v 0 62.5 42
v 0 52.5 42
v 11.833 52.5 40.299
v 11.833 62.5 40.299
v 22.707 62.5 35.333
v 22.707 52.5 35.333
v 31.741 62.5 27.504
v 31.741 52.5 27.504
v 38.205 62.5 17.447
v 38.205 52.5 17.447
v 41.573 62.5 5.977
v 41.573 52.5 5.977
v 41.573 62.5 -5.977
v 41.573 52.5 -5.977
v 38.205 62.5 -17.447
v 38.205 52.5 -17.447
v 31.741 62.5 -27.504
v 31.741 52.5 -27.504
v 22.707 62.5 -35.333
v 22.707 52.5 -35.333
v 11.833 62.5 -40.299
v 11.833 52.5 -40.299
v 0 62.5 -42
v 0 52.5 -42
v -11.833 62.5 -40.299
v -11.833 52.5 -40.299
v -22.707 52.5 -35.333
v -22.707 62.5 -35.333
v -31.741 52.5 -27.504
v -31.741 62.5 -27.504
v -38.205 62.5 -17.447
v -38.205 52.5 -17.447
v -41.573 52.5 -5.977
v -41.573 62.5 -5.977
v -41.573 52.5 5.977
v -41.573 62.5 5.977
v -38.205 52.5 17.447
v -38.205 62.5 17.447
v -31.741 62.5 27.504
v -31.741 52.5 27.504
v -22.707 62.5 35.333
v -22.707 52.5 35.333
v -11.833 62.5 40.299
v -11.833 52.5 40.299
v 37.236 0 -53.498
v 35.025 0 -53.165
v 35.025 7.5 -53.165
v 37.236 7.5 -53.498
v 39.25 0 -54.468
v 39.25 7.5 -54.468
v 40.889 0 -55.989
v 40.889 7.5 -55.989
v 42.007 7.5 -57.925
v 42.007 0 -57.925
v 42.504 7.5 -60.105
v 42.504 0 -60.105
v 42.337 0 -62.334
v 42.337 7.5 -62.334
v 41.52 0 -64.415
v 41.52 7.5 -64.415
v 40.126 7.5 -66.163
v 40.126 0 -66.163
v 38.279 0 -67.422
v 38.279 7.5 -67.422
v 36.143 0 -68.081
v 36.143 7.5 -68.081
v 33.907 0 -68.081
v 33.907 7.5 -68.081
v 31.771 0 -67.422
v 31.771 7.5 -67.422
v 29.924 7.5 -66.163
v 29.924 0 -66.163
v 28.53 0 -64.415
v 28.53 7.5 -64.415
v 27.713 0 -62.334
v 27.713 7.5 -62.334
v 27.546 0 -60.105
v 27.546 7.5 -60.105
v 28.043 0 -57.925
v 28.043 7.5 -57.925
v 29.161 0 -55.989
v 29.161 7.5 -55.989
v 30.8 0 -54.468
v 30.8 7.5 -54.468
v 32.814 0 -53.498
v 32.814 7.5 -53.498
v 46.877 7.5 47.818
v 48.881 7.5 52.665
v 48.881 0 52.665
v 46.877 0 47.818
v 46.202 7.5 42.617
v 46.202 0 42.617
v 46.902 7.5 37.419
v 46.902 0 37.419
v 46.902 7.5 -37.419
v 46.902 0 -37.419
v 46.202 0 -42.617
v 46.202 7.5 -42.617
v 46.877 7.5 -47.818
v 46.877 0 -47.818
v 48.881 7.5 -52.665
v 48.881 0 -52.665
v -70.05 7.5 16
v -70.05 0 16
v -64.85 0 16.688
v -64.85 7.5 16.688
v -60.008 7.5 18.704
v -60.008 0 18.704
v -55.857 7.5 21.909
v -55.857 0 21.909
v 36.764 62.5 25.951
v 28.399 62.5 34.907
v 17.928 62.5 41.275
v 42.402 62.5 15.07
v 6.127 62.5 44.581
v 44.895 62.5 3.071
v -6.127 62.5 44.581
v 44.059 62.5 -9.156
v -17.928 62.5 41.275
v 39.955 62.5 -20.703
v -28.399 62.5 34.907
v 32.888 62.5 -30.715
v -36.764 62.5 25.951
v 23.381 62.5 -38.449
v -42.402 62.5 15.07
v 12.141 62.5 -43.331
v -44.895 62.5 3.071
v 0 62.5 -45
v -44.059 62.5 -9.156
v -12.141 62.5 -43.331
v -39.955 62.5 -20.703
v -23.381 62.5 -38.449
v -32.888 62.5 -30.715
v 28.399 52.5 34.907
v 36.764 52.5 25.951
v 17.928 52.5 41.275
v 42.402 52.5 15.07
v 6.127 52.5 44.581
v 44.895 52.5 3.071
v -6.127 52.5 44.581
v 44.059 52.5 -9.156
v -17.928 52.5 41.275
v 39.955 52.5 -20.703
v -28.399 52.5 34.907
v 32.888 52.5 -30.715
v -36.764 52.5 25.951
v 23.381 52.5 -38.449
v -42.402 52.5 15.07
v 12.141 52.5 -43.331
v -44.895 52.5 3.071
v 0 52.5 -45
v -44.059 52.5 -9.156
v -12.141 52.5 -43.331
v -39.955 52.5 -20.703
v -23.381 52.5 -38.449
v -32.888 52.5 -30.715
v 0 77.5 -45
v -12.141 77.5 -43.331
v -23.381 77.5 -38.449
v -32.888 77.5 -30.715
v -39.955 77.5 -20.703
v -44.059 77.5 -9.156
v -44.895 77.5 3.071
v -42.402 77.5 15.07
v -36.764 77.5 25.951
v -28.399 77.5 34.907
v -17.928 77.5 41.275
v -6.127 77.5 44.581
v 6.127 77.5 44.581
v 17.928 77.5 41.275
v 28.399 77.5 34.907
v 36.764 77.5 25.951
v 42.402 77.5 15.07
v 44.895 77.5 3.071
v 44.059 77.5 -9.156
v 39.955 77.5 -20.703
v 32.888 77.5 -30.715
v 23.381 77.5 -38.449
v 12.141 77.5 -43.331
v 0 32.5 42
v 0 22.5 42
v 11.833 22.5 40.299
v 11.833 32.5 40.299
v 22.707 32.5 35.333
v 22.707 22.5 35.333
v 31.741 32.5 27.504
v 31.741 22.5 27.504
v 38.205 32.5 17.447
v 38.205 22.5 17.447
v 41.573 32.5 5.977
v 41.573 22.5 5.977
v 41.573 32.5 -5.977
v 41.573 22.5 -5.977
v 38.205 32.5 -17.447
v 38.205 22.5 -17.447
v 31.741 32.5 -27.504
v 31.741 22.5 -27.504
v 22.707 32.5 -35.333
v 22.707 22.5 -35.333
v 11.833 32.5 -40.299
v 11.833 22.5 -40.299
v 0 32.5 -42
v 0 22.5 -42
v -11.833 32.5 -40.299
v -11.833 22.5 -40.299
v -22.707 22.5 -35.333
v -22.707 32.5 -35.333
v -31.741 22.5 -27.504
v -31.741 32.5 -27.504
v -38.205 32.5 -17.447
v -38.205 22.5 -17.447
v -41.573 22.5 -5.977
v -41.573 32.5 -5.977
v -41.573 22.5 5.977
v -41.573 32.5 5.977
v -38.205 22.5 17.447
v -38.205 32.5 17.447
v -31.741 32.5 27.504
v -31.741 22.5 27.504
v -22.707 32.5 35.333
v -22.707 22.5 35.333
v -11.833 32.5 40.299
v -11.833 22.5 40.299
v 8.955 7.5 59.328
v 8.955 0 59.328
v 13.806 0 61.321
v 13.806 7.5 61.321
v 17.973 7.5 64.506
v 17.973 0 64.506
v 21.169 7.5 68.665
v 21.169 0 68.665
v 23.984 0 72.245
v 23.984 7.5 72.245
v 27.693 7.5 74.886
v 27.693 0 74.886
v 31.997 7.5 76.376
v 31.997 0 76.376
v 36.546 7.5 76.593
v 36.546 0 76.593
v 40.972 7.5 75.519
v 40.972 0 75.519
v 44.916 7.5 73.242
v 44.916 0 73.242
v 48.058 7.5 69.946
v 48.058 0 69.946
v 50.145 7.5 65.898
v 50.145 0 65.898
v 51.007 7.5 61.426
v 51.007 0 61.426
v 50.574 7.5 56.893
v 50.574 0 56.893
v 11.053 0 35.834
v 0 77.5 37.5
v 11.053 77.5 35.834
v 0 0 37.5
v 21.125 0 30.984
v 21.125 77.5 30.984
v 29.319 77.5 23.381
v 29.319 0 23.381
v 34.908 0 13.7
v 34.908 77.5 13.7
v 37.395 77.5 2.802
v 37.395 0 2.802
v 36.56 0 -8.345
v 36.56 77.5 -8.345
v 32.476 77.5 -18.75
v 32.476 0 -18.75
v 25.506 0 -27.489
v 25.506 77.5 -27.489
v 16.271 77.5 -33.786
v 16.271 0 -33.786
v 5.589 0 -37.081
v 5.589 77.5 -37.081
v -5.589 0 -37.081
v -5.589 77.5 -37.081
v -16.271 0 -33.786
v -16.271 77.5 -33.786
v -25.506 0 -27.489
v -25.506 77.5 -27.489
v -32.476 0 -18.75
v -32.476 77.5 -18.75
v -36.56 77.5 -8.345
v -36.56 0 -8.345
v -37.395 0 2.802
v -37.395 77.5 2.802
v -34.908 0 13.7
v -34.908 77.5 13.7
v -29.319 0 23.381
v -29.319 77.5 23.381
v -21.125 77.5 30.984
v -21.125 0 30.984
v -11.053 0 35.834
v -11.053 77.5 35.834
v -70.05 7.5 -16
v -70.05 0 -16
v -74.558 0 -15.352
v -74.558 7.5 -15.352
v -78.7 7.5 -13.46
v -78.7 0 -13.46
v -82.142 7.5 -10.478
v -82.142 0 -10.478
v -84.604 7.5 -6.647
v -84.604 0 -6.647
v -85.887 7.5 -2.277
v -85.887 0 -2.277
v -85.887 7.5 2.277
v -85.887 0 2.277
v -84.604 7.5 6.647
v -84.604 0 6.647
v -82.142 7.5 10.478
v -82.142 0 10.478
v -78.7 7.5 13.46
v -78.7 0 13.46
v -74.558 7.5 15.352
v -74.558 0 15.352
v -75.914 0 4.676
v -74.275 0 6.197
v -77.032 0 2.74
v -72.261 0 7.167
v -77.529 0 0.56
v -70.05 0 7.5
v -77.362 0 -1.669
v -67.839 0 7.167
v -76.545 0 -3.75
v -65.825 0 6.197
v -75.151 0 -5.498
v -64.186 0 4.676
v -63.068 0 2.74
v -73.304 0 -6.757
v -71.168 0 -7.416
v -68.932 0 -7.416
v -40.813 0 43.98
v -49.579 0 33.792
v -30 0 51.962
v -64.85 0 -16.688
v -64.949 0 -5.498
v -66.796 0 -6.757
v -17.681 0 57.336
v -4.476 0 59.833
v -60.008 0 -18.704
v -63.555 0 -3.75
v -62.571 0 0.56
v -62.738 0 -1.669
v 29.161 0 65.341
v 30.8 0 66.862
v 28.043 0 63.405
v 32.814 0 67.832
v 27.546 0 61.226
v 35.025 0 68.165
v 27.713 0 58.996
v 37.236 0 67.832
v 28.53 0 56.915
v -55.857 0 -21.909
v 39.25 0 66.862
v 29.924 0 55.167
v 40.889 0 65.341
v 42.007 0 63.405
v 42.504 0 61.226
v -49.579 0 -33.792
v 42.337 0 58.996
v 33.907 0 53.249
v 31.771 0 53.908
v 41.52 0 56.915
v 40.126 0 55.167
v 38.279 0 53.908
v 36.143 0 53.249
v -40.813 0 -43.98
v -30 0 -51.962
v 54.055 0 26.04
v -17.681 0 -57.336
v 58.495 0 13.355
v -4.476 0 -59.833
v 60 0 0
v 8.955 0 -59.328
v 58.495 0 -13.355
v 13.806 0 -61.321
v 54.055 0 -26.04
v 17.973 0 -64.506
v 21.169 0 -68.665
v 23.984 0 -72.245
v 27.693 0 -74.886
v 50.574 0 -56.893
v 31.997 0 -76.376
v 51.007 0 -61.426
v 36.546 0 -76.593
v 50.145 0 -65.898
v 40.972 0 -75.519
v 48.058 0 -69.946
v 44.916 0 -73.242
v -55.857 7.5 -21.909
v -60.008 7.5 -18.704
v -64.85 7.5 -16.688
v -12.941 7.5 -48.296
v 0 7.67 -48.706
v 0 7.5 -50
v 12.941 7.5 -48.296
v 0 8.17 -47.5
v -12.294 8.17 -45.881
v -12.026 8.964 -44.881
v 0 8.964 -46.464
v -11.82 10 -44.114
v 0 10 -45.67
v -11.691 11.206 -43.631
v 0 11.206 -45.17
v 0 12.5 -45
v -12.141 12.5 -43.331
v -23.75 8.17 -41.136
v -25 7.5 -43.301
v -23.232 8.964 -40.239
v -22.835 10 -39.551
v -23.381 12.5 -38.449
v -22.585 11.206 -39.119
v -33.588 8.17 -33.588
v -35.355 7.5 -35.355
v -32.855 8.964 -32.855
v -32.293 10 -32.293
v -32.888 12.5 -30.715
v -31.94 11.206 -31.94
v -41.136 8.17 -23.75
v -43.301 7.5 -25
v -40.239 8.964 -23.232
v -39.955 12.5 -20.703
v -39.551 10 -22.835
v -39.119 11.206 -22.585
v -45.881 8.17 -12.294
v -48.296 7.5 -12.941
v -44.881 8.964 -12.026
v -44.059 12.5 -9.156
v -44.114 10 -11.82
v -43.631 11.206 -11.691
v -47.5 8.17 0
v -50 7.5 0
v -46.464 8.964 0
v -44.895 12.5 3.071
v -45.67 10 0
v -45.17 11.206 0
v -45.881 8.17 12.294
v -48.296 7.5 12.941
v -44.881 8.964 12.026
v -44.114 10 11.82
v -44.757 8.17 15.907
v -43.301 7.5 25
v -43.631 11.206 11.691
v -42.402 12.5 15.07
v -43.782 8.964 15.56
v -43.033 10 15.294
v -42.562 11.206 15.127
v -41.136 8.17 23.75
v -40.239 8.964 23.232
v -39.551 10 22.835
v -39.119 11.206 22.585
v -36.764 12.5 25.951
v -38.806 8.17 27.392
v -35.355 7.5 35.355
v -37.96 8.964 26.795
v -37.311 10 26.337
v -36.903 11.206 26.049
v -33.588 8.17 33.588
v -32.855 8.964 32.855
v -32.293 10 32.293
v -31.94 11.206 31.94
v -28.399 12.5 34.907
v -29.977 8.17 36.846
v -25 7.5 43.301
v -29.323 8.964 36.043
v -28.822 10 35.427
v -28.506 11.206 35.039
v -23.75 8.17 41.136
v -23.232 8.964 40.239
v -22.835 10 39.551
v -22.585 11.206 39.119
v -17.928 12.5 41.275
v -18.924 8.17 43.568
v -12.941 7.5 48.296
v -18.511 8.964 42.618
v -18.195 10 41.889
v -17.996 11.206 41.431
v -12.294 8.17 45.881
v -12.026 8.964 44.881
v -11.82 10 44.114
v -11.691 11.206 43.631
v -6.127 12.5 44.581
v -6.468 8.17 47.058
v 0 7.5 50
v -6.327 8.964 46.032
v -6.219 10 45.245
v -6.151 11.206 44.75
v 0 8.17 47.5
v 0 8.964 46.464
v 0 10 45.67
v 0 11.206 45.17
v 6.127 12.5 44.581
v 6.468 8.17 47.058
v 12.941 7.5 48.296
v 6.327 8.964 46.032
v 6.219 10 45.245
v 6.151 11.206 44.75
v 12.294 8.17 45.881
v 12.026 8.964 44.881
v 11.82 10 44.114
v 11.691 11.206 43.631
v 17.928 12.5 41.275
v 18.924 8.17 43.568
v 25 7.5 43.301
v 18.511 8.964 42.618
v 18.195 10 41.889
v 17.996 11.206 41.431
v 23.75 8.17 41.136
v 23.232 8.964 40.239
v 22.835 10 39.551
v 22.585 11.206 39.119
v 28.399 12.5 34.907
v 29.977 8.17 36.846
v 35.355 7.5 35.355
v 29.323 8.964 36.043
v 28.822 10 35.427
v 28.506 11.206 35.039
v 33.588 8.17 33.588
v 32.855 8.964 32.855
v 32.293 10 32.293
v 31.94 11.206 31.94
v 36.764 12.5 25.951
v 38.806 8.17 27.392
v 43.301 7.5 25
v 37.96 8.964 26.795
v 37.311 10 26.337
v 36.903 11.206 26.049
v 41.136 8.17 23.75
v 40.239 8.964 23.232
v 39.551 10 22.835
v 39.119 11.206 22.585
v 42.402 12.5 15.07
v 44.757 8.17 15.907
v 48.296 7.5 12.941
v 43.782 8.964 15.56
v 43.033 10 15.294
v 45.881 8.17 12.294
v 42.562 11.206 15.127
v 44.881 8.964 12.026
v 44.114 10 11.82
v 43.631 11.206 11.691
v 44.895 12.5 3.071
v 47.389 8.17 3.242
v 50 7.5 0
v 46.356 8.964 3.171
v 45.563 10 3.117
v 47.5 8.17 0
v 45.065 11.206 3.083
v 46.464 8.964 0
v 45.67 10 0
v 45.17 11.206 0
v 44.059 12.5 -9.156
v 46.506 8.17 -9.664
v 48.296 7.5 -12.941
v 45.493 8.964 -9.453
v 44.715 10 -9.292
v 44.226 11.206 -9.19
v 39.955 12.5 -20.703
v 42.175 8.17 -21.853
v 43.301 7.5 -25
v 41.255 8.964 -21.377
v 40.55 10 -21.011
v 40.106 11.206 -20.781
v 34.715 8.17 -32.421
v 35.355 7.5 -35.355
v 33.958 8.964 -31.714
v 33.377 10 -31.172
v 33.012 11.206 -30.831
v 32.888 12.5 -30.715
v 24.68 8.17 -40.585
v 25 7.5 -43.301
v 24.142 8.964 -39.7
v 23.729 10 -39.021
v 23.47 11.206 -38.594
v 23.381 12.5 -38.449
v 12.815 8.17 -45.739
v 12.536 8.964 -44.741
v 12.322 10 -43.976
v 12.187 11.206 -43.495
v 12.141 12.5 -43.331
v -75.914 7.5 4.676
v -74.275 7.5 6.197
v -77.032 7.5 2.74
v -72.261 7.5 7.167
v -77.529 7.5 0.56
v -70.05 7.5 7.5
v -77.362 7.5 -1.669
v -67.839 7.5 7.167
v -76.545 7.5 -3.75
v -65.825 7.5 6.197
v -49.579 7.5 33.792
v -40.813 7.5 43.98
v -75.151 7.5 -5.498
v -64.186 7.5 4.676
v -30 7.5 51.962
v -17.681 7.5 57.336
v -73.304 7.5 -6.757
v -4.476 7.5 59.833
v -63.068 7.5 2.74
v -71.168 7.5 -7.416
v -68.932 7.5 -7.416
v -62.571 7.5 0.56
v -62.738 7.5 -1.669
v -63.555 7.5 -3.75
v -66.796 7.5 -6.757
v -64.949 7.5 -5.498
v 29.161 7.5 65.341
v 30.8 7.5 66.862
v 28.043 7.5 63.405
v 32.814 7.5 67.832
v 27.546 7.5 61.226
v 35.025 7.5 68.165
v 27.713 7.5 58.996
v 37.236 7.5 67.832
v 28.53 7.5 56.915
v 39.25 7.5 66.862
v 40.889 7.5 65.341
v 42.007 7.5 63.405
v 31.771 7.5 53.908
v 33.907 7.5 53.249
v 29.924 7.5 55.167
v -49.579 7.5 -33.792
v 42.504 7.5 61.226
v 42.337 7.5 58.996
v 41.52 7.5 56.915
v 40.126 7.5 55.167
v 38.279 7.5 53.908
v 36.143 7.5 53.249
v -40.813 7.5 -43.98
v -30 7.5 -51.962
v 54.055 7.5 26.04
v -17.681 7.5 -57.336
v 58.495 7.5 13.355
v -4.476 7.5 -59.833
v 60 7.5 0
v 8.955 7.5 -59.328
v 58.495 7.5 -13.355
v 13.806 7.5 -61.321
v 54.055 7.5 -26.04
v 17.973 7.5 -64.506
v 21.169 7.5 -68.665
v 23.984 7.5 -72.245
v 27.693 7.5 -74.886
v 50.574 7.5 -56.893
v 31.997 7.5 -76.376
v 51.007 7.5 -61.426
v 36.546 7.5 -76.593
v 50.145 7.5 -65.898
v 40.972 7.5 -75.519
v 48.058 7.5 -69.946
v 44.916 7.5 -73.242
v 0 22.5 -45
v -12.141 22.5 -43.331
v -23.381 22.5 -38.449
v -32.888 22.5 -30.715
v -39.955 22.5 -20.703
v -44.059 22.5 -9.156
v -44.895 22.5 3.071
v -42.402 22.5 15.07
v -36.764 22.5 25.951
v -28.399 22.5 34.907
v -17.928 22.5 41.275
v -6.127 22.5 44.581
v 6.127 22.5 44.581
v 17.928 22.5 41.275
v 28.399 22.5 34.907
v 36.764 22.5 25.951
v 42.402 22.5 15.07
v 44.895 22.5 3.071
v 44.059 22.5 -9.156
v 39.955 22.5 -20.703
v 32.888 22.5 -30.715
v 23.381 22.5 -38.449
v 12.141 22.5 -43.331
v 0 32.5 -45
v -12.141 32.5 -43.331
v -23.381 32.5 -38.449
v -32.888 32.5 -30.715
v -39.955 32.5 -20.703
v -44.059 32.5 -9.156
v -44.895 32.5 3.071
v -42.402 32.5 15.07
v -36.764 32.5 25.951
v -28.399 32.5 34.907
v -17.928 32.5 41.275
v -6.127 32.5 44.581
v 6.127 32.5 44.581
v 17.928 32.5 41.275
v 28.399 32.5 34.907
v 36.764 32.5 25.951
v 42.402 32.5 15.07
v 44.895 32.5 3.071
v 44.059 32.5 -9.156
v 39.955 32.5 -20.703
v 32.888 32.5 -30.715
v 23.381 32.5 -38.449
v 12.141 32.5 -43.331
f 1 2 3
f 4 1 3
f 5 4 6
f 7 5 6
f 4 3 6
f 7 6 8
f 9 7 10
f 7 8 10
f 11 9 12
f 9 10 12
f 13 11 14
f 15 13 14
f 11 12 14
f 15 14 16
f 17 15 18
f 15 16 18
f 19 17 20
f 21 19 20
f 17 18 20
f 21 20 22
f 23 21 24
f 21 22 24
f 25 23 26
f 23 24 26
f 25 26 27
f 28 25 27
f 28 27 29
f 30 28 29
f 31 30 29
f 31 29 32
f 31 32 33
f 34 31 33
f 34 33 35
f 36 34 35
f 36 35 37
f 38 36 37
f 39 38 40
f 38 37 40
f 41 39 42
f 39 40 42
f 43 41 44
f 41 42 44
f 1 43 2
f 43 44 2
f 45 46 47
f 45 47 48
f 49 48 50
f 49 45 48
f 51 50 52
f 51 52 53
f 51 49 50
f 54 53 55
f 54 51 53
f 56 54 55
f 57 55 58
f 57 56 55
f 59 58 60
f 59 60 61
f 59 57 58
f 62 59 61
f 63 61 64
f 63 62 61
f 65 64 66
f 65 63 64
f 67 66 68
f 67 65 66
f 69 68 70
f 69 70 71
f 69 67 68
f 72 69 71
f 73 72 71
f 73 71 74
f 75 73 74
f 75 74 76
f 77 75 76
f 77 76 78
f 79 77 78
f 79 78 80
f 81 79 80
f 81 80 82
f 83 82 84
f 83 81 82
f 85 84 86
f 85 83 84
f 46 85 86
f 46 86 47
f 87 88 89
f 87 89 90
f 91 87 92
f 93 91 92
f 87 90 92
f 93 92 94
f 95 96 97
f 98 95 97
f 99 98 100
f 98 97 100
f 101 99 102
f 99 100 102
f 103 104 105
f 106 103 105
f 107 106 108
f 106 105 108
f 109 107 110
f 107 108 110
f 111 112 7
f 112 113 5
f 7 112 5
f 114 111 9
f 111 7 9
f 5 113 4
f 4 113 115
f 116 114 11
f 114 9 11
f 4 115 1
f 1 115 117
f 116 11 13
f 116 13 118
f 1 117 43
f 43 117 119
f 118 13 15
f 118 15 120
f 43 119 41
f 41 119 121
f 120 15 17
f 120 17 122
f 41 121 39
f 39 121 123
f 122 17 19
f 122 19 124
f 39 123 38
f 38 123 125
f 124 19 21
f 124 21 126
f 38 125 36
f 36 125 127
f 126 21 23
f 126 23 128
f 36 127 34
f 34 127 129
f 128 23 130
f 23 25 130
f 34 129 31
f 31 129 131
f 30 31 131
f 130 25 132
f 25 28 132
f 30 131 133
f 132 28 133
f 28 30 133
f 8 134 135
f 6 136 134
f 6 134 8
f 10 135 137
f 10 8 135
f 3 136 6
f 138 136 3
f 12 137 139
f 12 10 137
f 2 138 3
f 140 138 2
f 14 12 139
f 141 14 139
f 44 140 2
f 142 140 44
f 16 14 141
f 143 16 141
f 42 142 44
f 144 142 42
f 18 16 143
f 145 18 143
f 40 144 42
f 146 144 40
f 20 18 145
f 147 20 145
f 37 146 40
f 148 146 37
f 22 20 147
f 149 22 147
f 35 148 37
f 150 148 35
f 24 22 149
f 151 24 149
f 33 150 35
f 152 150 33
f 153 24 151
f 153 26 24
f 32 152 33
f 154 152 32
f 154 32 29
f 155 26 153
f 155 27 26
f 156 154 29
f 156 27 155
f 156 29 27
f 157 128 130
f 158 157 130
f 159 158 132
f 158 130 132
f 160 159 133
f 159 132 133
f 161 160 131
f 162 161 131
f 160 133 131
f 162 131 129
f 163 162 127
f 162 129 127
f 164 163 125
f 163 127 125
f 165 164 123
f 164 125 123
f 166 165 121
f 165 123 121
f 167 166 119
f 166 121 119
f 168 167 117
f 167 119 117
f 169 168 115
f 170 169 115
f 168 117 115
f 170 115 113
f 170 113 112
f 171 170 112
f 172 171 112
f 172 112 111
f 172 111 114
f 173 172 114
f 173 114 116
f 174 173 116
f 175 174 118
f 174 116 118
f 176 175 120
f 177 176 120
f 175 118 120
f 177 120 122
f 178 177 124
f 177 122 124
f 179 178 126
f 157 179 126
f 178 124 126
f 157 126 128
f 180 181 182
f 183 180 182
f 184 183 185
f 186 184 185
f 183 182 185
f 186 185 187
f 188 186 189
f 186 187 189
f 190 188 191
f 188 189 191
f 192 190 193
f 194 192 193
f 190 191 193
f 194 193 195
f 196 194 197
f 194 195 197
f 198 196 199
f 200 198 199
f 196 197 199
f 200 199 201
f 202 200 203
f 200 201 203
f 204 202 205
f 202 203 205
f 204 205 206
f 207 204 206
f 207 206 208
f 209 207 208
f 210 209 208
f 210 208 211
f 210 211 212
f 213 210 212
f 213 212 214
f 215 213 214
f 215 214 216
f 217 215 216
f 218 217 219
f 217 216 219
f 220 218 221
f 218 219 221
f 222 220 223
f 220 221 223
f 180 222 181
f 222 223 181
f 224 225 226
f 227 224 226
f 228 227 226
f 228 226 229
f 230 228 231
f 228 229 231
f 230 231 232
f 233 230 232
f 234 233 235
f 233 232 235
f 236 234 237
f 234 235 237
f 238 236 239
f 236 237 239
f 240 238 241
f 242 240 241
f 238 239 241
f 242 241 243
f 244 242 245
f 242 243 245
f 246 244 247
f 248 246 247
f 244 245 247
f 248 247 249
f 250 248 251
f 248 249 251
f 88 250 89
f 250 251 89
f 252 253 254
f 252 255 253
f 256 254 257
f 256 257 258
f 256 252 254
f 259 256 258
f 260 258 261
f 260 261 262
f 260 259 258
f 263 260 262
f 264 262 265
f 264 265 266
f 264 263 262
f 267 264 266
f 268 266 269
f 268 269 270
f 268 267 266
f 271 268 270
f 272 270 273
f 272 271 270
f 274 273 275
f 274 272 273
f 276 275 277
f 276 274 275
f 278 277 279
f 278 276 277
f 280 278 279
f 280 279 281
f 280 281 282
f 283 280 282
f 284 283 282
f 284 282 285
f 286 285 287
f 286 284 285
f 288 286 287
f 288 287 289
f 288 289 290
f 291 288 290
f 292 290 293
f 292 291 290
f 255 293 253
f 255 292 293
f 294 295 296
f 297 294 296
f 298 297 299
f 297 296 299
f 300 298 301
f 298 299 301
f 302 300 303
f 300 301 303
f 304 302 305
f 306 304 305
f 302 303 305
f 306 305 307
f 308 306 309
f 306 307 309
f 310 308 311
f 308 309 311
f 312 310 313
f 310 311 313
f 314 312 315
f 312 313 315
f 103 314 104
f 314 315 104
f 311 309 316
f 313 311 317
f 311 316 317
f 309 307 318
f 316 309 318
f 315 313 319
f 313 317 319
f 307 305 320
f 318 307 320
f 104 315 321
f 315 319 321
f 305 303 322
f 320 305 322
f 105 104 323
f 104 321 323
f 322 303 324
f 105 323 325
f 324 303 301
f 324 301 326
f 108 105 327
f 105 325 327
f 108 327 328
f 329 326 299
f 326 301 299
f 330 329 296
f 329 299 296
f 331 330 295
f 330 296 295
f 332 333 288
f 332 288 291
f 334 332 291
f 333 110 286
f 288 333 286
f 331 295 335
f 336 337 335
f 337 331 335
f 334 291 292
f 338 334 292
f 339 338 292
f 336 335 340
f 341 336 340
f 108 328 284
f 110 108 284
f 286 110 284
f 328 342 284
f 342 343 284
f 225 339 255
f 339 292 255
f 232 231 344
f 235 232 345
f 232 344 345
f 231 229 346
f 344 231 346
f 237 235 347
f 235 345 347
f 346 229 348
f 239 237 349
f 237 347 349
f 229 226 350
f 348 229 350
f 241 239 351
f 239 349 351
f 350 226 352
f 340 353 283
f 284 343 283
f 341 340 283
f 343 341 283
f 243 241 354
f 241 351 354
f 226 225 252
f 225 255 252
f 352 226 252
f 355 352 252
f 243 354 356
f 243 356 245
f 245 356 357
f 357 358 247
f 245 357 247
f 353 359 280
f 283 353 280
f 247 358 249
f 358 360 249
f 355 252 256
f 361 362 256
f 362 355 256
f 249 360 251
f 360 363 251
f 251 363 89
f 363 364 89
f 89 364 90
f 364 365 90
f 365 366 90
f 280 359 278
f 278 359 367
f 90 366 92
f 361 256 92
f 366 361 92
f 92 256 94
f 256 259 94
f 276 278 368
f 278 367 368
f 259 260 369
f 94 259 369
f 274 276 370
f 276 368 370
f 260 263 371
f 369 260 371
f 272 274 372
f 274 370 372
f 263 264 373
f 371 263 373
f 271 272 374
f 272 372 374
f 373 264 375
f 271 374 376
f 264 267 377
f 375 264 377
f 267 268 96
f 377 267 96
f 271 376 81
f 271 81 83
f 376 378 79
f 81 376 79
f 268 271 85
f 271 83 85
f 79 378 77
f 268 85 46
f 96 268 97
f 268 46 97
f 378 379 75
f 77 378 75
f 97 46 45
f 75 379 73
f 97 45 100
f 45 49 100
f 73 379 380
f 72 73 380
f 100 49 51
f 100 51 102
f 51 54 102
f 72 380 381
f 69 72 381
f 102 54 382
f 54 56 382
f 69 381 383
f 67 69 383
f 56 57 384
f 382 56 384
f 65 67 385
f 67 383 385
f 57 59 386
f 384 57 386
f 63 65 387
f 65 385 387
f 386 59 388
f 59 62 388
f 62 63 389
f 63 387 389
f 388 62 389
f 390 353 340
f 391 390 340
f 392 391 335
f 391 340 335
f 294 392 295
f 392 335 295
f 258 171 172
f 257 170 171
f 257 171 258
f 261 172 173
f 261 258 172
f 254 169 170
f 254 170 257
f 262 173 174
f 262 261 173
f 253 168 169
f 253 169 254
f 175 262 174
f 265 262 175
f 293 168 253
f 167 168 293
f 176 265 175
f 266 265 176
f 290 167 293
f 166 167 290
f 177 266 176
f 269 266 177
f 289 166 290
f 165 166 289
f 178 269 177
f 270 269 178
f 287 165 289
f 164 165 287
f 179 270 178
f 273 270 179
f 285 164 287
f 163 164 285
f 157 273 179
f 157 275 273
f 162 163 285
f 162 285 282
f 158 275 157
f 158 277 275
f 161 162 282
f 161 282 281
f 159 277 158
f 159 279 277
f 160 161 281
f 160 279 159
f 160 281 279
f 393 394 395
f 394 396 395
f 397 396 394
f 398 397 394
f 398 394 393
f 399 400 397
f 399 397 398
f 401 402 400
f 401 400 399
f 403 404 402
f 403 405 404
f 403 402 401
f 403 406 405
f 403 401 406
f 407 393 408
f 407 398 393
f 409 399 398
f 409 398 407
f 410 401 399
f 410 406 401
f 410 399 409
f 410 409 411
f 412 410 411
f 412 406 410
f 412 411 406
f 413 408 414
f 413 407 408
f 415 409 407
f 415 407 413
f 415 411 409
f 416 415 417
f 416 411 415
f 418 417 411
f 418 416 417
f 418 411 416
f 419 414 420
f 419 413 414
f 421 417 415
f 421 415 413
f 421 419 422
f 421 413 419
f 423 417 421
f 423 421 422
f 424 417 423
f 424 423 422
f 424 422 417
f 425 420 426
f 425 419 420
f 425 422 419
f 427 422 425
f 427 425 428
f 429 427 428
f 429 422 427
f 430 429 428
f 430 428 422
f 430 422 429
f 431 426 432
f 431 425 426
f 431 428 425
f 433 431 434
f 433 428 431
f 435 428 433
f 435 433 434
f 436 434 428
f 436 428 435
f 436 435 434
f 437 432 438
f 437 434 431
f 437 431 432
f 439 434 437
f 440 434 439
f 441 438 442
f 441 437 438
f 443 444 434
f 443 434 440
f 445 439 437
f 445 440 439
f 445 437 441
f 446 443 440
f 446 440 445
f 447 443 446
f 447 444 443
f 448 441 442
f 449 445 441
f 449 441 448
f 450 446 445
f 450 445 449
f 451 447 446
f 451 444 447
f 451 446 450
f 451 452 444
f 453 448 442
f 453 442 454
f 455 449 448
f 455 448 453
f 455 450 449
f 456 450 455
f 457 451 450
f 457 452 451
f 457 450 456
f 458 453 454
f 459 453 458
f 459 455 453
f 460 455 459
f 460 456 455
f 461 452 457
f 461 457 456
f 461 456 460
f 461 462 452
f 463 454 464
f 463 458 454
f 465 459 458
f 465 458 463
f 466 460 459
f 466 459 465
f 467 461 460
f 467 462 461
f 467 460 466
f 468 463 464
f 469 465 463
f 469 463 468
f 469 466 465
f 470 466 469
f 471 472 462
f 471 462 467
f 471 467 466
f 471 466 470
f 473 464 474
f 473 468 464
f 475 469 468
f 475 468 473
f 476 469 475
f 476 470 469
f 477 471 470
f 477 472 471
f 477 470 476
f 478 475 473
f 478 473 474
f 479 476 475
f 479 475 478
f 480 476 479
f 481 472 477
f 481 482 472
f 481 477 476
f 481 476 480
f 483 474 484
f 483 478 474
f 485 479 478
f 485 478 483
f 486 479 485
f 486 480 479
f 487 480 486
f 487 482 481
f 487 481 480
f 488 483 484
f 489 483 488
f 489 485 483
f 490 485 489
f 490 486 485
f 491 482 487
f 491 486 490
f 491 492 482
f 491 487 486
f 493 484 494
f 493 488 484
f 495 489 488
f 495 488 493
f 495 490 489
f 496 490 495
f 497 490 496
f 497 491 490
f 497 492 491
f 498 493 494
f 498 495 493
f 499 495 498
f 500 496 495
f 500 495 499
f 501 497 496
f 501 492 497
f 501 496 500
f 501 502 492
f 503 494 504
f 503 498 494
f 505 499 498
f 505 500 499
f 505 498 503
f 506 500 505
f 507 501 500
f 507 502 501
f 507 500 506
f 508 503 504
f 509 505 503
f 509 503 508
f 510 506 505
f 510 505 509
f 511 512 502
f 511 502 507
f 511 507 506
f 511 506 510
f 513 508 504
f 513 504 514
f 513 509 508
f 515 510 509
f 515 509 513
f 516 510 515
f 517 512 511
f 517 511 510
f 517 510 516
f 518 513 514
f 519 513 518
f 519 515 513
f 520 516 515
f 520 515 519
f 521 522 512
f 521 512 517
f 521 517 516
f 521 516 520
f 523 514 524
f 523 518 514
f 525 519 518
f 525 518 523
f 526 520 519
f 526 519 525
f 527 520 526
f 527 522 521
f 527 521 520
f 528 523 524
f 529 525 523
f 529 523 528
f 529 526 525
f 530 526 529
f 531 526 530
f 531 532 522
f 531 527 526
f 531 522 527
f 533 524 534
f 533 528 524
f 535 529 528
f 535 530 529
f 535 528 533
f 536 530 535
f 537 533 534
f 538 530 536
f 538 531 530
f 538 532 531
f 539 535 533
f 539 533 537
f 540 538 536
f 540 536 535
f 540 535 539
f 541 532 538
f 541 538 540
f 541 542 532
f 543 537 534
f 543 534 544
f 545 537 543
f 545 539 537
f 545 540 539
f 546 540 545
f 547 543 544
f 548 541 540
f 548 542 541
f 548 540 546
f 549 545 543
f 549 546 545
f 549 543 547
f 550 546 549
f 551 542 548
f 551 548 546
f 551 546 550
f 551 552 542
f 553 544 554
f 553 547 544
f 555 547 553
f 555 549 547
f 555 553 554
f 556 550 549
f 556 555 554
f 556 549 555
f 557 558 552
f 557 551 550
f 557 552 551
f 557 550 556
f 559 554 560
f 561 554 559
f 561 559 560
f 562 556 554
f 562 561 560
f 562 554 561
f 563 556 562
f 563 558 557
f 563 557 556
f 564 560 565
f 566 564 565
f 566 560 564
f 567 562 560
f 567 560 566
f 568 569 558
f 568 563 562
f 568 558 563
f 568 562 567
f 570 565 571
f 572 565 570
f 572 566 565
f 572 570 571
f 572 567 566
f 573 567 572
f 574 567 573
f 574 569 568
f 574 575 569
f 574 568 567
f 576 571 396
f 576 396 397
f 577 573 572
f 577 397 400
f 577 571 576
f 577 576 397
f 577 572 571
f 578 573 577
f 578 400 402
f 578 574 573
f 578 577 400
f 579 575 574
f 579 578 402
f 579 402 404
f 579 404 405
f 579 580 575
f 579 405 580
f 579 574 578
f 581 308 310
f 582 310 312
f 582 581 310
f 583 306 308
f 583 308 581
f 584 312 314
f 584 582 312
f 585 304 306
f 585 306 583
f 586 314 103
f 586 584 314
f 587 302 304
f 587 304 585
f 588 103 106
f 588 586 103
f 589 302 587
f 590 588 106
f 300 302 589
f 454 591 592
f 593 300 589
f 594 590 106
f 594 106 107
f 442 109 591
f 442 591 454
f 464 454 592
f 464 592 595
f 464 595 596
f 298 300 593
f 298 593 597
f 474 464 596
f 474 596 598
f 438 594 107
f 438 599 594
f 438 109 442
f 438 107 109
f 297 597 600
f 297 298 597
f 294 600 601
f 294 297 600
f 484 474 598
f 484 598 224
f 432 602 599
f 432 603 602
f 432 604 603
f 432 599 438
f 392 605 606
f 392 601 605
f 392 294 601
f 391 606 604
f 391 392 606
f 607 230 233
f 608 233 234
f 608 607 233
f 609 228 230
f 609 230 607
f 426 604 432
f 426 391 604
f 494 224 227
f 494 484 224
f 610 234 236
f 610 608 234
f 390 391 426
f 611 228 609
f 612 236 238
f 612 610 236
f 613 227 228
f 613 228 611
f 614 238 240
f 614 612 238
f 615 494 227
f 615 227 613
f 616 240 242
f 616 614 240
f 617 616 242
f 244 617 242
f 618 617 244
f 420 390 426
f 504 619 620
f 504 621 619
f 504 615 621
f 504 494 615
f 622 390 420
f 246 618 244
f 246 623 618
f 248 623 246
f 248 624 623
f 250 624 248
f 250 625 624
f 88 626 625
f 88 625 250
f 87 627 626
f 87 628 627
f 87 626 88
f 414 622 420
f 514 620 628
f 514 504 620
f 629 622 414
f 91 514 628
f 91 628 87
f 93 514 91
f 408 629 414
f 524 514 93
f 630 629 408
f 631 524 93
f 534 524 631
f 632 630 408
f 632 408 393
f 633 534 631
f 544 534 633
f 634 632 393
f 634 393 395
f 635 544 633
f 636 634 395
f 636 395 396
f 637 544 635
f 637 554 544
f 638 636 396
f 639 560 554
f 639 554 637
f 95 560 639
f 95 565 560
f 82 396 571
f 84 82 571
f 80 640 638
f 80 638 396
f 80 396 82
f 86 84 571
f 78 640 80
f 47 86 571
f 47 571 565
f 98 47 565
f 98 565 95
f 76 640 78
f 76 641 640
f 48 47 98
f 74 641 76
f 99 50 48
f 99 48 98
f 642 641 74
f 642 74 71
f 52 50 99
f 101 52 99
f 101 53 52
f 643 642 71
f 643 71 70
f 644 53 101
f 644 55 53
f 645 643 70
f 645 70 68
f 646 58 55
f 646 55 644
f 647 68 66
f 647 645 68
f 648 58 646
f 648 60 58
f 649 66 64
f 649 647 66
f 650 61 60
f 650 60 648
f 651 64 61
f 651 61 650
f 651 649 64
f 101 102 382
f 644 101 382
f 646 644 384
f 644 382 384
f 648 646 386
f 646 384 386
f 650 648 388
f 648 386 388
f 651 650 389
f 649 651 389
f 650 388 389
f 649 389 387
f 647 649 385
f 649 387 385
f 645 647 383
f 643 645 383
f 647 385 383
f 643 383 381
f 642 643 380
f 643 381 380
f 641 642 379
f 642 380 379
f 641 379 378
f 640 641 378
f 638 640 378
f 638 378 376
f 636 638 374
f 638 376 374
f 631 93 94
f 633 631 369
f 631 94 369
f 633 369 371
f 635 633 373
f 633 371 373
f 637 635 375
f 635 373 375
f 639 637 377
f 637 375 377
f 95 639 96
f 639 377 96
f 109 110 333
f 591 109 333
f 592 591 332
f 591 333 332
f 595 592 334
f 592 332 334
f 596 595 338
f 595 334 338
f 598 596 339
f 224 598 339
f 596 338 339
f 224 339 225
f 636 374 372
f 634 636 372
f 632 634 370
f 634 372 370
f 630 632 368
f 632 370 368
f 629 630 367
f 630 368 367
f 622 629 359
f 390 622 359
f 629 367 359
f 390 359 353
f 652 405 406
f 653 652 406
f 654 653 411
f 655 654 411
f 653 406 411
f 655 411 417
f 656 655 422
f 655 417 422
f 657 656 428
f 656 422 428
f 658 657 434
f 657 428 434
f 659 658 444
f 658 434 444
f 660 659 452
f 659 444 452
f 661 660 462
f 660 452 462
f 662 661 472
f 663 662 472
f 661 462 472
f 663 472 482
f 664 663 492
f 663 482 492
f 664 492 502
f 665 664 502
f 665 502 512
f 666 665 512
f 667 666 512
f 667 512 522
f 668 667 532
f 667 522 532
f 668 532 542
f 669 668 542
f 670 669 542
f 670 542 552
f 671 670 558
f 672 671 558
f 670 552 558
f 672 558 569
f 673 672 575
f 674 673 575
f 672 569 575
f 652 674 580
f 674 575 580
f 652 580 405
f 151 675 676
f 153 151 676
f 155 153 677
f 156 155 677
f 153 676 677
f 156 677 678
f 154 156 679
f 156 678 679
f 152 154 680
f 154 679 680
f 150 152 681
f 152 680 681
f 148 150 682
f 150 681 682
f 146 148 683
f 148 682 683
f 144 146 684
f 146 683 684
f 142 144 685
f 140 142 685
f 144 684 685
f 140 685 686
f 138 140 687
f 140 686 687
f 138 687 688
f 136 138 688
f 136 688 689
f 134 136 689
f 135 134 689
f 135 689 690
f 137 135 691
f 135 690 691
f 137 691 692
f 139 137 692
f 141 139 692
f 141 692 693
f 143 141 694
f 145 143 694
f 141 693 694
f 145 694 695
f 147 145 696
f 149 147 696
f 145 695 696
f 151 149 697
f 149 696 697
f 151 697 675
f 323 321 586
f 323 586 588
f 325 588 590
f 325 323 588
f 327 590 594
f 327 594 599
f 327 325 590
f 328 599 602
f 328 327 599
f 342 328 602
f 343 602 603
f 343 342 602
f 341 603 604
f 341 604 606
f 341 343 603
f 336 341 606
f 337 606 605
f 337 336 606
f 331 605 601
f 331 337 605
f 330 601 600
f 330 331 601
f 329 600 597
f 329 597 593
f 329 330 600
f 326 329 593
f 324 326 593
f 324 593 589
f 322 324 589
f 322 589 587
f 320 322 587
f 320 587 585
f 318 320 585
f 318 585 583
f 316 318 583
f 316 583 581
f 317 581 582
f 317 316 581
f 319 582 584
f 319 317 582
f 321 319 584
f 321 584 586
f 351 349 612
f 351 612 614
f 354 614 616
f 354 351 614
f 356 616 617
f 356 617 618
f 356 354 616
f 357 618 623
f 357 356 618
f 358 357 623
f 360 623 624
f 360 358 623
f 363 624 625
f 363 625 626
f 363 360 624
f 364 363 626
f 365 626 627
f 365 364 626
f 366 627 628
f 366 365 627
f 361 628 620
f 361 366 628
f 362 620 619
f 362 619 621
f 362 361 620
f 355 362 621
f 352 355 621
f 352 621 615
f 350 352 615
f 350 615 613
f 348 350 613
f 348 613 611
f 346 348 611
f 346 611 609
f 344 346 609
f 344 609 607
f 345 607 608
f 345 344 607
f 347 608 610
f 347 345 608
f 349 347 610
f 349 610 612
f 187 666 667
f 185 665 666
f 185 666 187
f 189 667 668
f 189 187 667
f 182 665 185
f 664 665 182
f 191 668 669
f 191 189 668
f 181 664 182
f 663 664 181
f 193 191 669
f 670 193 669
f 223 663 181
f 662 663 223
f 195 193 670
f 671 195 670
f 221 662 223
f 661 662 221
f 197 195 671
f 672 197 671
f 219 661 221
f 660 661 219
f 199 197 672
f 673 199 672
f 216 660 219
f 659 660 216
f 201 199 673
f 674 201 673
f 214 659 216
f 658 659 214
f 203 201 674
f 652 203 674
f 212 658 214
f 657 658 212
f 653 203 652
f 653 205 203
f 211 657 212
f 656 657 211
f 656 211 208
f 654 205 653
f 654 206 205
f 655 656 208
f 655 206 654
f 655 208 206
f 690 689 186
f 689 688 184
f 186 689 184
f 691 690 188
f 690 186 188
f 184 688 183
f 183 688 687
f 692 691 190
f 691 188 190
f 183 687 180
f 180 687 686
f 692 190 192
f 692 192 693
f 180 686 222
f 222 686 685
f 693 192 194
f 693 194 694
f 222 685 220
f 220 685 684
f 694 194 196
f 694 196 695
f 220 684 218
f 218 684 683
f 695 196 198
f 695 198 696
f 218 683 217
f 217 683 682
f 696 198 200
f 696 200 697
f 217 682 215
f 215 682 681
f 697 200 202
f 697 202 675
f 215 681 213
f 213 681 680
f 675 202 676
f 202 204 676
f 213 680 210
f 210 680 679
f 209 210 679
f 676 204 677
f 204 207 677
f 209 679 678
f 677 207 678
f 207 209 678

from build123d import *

# Parameters (mm, degrees)
SKETCH2_R           = 37.5
SKETCH2_R_2         = 7.5
BOSS_EXTRUDE1_DEPTH = 7.5
SKETCH3_R           = 45
SKETCH3_R_2         = 37.5
BOSS_EXTRUDE2_DEPTH = 15
SKETCH4_R           = 42
SKETCH4_R_2         = 37.5
BOSS_EXTRUDE3_DEPTH = 10
SKETCH5_R           = 45
SKETCH5_R_2         = 42
SKETCH5_R_3         = 37.5
BOSS_EXTRUDE4_DEPTH = 20
SKETCH6_R           = 42
SKETCH6_R_2         = 37.5
BOSS_EXTRUDE5_DEPTH = 10
SKETCH7_R           = 45
SKETCH7_R_2         = 37.5
BOSS_EXTRUDE6_DEPTH = 15
FILLET1_R           = 5


with BuildPart() as part:
    # Sketch2 → Boss-Extrude1 (new body)
    with BuildSketch(Plane(origin=(0, 0, 0), x_dir=(1, 0, 0), z_dir=(0, 1, 0))):
        with BuildLine():
            ThreePointArc((8.95472604, 59.328010935), (-30, 51.961524227), (-55.856927646, 21.908985233))
            ThreePointArc((-55.856927646, 21.908985233), (-62.363007589, 17.536247736), (-70.05, 16))
            ThreePointArc((-70.05, 16), (-86.05, 0), (-70.05, -16))
            ThreePointArc((-70.05, -16), (-62.363007589, -17.536247736), (-55.856927646, -21.908985233))
            ThreePointArc((-55.856927646, -21.908985233), (-30, -51.961524227), (8.95472604, -59.328010935))
            ThreePointArc((8.95472604, -59.328010935), (15.994667768, -62.776072696), (21.168593539, -68.665079535))
            ThreePointArc((21.168593539, -68.665079535), (43.025, -74.521485996), (48.881406461, -52.665079535))
            ThreePointArc((48.881406461, -52.665079535), (46.368339821, -45.23982496), (46.902201606, -37.419025702))
            ThreePointArc((46.902201606, -37.419025702), (60, 0), (46.902201606, 37.419025702))
            ThreePointArc((46.902201606, 37.419025702), (46.368339821, 45.23982496), (48.881406461, 52.665079535))
            ThreePointArc((48.881406461, 52.665079535), (43.025, 74.521485996), (21.168593539, 68.665079535))
            ThreePointArc((21.168593539, 68.665079535), (15.994667768, 62.776072696), (8.95472604, 59.328010935))
        make_face()
        with Locations(Location((0, 0, 0), (0, 0, 270))):
            Circle(SKETCH2_R, mode=Mode.SUBTRACT)
        with Locations(Location((-70.05, 0, 0), (0, 0, 270))):
            Circle(SKETCH2_R_2, mode=Mode.SUBTRACT)
        with Locations(Location((35.025, 60.665079535, 0), (0, 0, 270))):
            Circle(SKETCH2_R_2, mode=Mode.SUBTRACT)
        with Locations(Location((35.025, -60.665079535, 0), (0, 0, 270))):
            Circle(SKETCH2_R_2, mode=Mode.SUBTRACT)
    extrude(amount=BOSS_EXTRUDE1_DEPTH)

    # Sketch3 → Boss-Extrude2 (add)
    with BuildSketch(Plane(origin=(0, 7.5, 0), x_dir=(1, 0, 0), z_dir=(0, 1, 0))):
        with Locations(Location((0, 0, 0), (0, 0, 90))):
            Circle(SKETCH3_R)
        with Locations(Location((0, 0, 0), (0, 0, 270))):
            Circle(SKETCH3_R_2, mode=Mode.SUBTRACT)
    extrude(amount=BOSS_EXTRUDE2_DEPTH)

    # Sketch4 → Boss-Extrude3 (add)
    with BuildSketch(Plane(origin=(0, 22.5, 0), x_dir=(1, 0, 0), z_dir=(0, 1, 0))):
        with Locations(Location((0, 0, 0), (0, 0, 270))):
            Circle(SKETCH4_R)
        with Locations(Location((0, 0, 0), (0, 0, 270))):
            Circle(SKETCH4_R_2, mode=Mode.SUBTRACT)
    extrude(amount=BOSS_EXTRUDE3_DEPTH)

    # Sketch5 → Boss-Extrude4 (add)
    # profile 1 of 2: a face of its own
    with BuildSketch(Plane(origin=(0, 32.5, 0), x_dir=(1, 0, 0), z_dir=(0, 1, 0))):
        with Locations(Location((0, 0, 0), (0, 0, 90))):
            Circle(SKETCH5_R)
        with Locations(Location((0, 0, 0), (0, 0, 270))):
            Circle(SKETCH5_R_2, mode=Mode.SUBTRACT)
    # profile 2 of 2: a face of its own
    with BuildSketch(Plane(origin=(0, 32.5, 0), x_dir=(1, 0, 0), z_dir=(0, 1, 0))):
        with Locations(Location((0, 0, 0), (0, 0, 270))):
            Circle(SKETCH5_R_2)
        with Locations(Location((0, 0, 0), (0, 0, 270))):
            Circle(SKETCH5_R_3, mode=Mode.SUBTRACT)
    extrude(amount=BOSS_EXTRUDE4_DEPTH)

    # Sketch6 → Boss-Extrude5 (add)
    with BuildSketch(Plane(origin=(0, 52.5, 0), x_dir=(1, 0, 0), z_dir=(0, 1, 0))):
        with Locations(Location((0, 0, 0), (0, 0, 270))):
            Circle(SKETCH6_R)
        with Locations(Location((0, 0, 0), (0, 0, 270))):
            Circle(SKETCH6_R_2, mode=Mode.SUBTRACT)
    extrude(amount=BOSS_EXTRUDE5_DEPTH)

    # Sketch7 → Boss-Extrude6 (add)
    with BuildSketch(Plane(origin=(0, 62.5, 0), x_dir=(1, 0, 0), z_dir=(0, 1, 0))):
        with Locations(Location((0, 0, 0), (0, 0, 90))):
            Circle(SKETCH7_R)
        with Locations(Location((0, 0, 0), (0, 0, 270))):
            Circle(SKETCH7_R_2, mode=Mode.SUBTRACT)
    extrude(amount=BOSS_EXTRUDE6_DEPTH)

    # Fillet1
    fillet1_edges = [part.edges().sort_by_distance(p)[0] for p in [
        (0, 7.5, 45),
    ]]
    fillet(fillet1_edges, radius=FILLET1_R)


solid = part.part
